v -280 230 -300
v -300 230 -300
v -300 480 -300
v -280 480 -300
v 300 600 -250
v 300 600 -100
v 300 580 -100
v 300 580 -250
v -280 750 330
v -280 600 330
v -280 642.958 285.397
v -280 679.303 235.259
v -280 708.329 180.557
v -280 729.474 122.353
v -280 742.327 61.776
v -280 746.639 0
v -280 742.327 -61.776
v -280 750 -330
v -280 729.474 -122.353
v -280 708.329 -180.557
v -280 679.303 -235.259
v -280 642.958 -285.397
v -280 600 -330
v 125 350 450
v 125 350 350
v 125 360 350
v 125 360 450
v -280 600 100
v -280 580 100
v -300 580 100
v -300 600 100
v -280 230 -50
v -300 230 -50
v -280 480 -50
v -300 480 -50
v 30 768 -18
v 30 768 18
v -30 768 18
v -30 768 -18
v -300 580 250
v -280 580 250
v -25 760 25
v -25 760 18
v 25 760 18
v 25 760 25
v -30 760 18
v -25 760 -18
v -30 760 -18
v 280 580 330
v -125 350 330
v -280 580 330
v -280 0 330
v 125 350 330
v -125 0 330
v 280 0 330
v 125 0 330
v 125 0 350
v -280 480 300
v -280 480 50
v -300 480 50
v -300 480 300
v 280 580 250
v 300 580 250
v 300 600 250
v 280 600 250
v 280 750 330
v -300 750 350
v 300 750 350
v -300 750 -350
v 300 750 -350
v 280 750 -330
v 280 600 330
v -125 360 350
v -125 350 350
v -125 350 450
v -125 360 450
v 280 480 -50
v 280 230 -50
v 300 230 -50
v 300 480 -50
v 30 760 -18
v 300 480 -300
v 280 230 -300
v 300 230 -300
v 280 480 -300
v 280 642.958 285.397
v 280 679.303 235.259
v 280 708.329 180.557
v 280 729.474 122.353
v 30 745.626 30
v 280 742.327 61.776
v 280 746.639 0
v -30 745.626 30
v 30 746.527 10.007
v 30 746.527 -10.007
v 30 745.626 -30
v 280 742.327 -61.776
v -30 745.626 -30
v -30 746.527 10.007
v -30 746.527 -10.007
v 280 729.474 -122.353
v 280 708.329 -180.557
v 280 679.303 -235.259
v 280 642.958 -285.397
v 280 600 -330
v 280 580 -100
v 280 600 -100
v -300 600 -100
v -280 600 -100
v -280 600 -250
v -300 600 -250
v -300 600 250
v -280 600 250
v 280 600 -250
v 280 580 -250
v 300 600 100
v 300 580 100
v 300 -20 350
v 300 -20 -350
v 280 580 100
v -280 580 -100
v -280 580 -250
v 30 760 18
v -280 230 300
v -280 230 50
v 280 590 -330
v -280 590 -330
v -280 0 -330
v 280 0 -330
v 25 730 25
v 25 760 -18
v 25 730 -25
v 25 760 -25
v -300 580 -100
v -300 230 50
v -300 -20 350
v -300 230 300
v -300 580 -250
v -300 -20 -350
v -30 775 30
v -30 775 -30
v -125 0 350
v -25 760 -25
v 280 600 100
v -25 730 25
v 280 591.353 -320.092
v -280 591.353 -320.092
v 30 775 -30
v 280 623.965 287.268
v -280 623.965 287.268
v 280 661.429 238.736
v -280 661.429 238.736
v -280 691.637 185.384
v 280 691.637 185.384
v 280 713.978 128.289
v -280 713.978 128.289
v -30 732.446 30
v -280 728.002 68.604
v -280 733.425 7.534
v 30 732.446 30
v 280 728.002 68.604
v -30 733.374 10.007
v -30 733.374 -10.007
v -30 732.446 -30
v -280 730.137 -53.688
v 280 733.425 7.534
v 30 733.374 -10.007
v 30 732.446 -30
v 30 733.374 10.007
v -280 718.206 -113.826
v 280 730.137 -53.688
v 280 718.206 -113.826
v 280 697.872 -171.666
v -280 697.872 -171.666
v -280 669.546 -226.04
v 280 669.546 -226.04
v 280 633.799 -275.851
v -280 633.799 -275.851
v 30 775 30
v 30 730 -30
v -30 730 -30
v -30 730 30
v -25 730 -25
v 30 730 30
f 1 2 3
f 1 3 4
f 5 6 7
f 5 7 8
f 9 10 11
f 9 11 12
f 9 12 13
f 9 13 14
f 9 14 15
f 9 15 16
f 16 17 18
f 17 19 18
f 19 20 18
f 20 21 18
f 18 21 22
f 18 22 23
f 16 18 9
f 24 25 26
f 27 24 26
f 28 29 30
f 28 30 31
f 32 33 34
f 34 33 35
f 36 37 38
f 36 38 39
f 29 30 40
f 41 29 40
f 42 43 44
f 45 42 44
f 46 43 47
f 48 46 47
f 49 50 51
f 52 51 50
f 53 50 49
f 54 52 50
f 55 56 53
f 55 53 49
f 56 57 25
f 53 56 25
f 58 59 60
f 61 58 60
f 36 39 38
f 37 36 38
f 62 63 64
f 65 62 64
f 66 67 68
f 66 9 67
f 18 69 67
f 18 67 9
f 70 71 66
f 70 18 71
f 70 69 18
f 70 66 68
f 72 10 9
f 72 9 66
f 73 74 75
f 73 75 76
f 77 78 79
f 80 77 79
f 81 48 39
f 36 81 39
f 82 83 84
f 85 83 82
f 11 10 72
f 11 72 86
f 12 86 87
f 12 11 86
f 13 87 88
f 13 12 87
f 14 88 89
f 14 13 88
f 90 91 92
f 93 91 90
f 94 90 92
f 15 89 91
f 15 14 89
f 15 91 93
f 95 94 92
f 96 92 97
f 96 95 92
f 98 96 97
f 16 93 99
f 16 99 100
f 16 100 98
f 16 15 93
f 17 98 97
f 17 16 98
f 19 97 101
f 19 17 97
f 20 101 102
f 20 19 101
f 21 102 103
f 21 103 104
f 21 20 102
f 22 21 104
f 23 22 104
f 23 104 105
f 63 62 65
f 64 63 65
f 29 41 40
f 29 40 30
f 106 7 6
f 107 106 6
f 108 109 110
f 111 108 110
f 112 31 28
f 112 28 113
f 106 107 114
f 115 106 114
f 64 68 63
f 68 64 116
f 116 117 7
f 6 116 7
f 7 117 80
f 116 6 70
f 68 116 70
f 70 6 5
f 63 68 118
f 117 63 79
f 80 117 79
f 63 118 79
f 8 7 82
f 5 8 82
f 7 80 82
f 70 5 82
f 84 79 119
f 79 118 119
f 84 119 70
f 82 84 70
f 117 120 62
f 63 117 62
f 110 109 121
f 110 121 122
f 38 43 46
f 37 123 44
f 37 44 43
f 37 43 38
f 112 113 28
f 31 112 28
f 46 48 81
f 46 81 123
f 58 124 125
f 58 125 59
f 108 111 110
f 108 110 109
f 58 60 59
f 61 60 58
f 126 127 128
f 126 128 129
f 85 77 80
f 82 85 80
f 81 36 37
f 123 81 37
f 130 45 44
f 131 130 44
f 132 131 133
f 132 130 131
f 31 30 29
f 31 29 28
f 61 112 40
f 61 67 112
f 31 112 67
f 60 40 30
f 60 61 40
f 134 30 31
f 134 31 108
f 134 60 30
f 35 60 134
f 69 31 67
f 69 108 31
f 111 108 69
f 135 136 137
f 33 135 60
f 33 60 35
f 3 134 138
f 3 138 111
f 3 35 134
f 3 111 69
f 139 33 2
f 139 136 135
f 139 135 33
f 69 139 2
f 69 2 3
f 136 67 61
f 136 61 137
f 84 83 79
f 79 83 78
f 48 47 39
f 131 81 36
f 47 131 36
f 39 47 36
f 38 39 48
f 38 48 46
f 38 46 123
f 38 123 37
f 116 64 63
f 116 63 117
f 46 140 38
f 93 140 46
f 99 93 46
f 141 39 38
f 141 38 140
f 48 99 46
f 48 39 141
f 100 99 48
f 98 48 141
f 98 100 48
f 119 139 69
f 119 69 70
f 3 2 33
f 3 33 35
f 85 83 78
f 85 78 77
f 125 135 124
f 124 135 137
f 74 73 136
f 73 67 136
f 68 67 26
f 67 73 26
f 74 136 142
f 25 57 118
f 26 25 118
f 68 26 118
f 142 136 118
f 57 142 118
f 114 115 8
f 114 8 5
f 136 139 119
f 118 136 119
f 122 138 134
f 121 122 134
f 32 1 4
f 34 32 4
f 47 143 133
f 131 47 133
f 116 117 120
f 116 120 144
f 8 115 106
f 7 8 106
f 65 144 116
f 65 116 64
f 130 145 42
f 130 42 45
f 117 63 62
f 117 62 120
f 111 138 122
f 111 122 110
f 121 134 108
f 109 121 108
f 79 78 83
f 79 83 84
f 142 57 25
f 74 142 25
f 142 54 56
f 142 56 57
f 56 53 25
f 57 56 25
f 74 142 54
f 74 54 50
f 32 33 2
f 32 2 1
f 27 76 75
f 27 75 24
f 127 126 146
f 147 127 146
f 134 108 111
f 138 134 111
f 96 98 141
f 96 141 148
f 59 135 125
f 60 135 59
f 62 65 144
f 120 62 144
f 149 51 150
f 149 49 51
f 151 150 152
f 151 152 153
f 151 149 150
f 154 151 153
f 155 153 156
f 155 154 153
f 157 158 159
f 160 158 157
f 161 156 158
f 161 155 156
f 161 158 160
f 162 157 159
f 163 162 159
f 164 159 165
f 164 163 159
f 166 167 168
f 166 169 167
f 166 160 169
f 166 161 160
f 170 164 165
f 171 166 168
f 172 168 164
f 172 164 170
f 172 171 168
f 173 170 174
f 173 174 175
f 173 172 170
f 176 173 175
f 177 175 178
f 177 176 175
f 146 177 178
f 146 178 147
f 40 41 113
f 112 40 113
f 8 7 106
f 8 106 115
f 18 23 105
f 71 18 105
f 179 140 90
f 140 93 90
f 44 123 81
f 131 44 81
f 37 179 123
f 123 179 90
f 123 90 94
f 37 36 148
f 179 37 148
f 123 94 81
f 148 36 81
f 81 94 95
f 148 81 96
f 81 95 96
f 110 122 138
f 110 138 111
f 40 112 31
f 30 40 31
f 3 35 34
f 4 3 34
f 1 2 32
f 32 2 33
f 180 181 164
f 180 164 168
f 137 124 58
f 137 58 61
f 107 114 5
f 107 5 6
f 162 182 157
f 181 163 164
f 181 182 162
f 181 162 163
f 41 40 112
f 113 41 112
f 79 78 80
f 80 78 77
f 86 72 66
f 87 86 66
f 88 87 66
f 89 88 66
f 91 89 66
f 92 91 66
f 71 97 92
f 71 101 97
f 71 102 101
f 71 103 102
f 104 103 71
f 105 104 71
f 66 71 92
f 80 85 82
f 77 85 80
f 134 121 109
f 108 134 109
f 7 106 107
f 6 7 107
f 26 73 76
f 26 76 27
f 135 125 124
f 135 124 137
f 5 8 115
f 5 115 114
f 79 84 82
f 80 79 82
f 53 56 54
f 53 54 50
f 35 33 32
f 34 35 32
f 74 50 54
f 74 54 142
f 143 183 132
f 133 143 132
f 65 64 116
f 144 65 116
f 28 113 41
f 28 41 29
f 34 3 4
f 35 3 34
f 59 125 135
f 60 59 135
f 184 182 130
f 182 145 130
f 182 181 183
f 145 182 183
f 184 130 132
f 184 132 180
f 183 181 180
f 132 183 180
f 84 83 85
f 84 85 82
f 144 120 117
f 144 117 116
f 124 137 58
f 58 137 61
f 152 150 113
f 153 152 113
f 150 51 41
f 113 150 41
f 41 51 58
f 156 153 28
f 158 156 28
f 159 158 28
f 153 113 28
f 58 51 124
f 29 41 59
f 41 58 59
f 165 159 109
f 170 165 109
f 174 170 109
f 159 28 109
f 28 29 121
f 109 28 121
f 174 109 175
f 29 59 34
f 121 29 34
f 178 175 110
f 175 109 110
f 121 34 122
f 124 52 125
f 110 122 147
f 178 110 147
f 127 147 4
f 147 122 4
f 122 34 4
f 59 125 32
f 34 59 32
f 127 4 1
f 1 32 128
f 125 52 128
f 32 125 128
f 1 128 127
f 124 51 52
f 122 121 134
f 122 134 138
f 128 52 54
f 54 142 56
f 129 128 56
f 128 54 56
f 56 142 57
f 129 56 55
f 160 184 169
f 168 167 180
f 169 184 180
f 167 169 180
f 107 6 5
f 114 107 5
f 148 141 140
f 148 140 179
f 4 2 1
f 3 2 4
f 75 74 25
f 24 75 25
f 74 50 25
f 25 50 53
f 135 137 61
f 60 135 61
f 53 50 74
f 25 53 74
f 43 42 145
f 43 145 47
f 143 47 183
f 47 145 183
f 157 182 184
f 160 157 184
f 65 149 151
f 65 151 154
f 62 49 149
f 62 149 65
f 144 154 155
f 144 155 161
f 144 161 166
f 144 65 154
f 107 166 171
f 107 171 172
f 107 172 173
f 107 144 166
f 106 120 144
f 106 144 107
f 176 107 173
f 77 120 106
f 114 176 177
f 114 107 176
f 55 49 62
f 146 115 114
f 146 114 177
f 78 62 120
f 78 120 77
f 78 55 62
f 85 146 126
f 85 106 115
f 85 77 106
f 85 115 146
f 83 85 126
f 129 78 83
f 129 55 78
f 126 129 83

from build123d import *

# Parameters (mm, degrees)
SKETCH16_W             = 600
SKETCH16_H             = 700
BOSS_EXTRUDE1_DEPTH    = 20
SKETCH16_2_W           = 600
SKETCH16_2_H           = 700
BOSS_EXTRUDE2_DEPTH    = 750
SHELL1_T               = -20
SKETCH17_W             = 560
SKETCH17_H             = 20
SKETCH28_W             = 250
SKETCH28_H             = 250
CUT_EXTRUDE6_DEPTH     = 1023.252415013
SKETCH28_5_W           = 250
SKETCH28_5_H           = 250
CUT_EXTRUDE7_DEPTH     = 170
SKETCH28_6_W           = 150
SKETCH28_6_H           = 20
CUT_EXTRUDE8_DEPTH     = 1023.252415013
SKETCH28_7_W           = 150
SKETCH28_7_H           = 20
CUT_EXTRUDE9_DEPTH     = 1023.252415013
SKETCH35_W             = 250
SKETCH35_H             = 350
CUT_EXTRUDE10_DEPTH    = 170
SKETCH36_W             = 250
SKETCH36_H             = 10
BOSS_EXTRUDE6_DEPTH    = 100
SKETCH45_W             = 60
SKETCH45_H             = 60
BOSS_EXTRUDE7_DEPTH    = 40
SKETCH46_W             = 50
SKETCH46_H             = 50
CUT_EXTRUDE12_DEPTH    = 30
SKETCH47_W             = 60
SKETCH47_H             = 60
BOSS_EXTRUDE8_DEPTH    = 5
SKETCH48_W             = 36
SKETCH48_H             = 8
CUT_EXTRUDE13_DEPTH    = 63
SKETCH49_W             = 20
SKETCH49_H             = 350
BOSS_EXTRUDE10_DEPTH   = 250
SKETCH50_W             = 20
SKETCH50_H             = 250
BOSS_EXTRUDE11_DEPTH   = 250
SKETCH52_W             = 20
SKETCH52_H             = 250
BOSS_EXTRUDE12_DEPTH   = 250
SKETCH53_W             = 20
SKETCH53_H             = 250
BOSS_EXTRUDE13_DEPTH   = 250
SKETCH54_W             = 36
SKETCH54_H             = 8
BOSS_EXTRUDE14_DEPTH   = 60
SKETCH55_W             = 150
SKETCH55_H             = 20
BOSS_EXTRUDE15_DEPTH   = 20
BOSS_EXTRUDE15_2_DEPTH = 20
SKETCH56_W             = 150
SKETCH56_H             = 20
BOSS_EXTRUDE16_DEPTH   = 20
BOSS_EXTRUDE16_2_DEPTH = 20


with BuildPart() as part:
    # Sketch16 → Boss-Extrude1 (new body)
    with BuildSketch(Plane(origin=(0, 0, 0), x_dir=(1, 0, 0), z_dir=(0, 1, 0))):
        Rectangle(SKETCH16_W, SKETCH16_H)
    extrude(amount=-BOSS_EXTRUDE1_DEPTH)

    # Sketch16<2> → Boss-Extrude2 (add)
    with BuildSketch(Plane(origin=(0, 0, 0), x_dir=(1, 0, 0), z_dir=(0, 1, 0))):
        Rectangle(SKETCH16_2_W, SKETCH16_2_H)
    extrude(amount=BOSS_EXTRUDE2_DEPTH)

    # Shell1
    shell1_openings = [part.faces().sort_by_distance(p)[0] for p in [
        (0, 750, 0),
    ]]
    offset(amount=SHELL1_T, openings=shell1_openings, kind=Kind.INTERSECTION)

    # Sweep1: sweep along a path in Sketch18
    with BuildLine(Plane(origin=(0, 0, 0), x_dir=(0, 0, -1), z_dir=(1, 0, 0))) as sweep1_path:
        ThreePointArc((-330, 590), (0, 740), (330, 590))
    # Sketch17 → Sweep1 (sweep)
    with BuildSketch(Plane.XY.offset(330)):
        with Locations((0, 590)):
            Rectangle(SKETCH17_W, SKETCH17_H)
    sweep(path=sweep1_path.line)

    # Sketch28 → Cut-Extrude6 (cut, through all)
    with BuildSketch(Plane.ZY.offset(300)):
        with Locations((-175, 355)):
            Rectangle(SKETCH28_W, SKETCH28_H)
    extrude(amount=-CUT_EXTRUDE6_DEPTH, mode=Mode.SUBTRACT)

    # Sketch28<5> → Cut-Extrude7 (cut)
    with BuildSketch(Plane.ZY.offset(300)):
        with Locations((175, 355)):
            Rectangle(SKETCH28_5_W, SKETCH28_5_H)
    extrude(amount=-CUT_EXTRUDE7_DEPTH, mode=Mode.SUBTRACT)

    # Sketch28<6> → Cut-Extrude8 (cut, through all)
    with BuildSketch(Plane.ZY.offset(300)):
        with Locations((-175, 590)):
            Rectangle(SKETCH28_6_W, SKETCH28_6_H)
    extrude(amount=-CUT_EXTRUDE8_DEPTH, mode=Mode.SUBTRACT)

    # Sketch28<7> → Cut-Extrude9 (cut, through all)
    with BuildSketch(Plane.ZY.offset(300)):
        with Locations((175, 590)):
            Rectangle(SKETCH28_7_W, SKETCH28_7_H)
    extrude(amount=-CUT_EXTRUDE9_DEPTH, mode=Mode.SUBTRACT)

    # Sketch35 → Cut-Extrude10 (cut)
    with BuildSketch(Plane.XY.offset(350)):
        with Locations((0, 175)):
            Rectangle(SKETCH35_W, SKETCH35_H)
    extrude(amount=-CUT_EXTRUDE10_DEPTH, mode=Mode.SUBTRACT)

    # Sketch36 → Boss-Extrude6 (add)
    with BuildSketch(Plane.XY.offset(350)):
        with Locations((0, 355)):
            Rectangle(SKETCH36_W, SKETCH36_H)
    extrude(amount=BOSS_EXTRUDE6_DEPTH)

    # Sketch45 → Boss-Extrude7 (add)
    with BuildSketch(Plane(origin=(0, 730, 0), x_dir=(1, 0, 0), z_dir=(0, 1, 0))):
        Rectangle(SKETCH45_W, SKETCH45_H)
    extrude(amount=BOSS_EXTRUDE7_DEPTH)

    # Sketch46 → Cut-Extrude12 (cut)
    with BuildSketch(Plane(origin=(0, 730, 0), x_dir=(1, 0, 0), z_dir=(0, 1, 0))):
        Rectangle(SKETCH46_W, SKETCH46_H)
    extrude(amount=CUT_EXTRUDE12_DEPTH, mode=Mode.SUBTRACT)

    # Sketch47 → Boss-Extrude8 (add)
    with BuildSketch(Plane(origin=(0, 770, 0), x_dir=(1, 0, 0), z_dir=(0, 1, 0))):
        Rectangle(SKETCH47_W, SKETCH47_H)
    extrude(amount=BOSS_EXTRUDE8_DEPTH)

    # Sketch48 → Cut-Extrude13 (cut)
    with BuildSketch(Plane(origin=(30, 0, 0), x_dir=(0, 0, -1), z_dir=(1, 0, 0))):
        with Locations((0, 764)):
            Rectangle(SKETCH48_W, SKETCH48_H)
    extrude(amount=-CUT_EXTRUDE13_DEPTH, mode=Mode.SUBTRACT)


with BuildPart() as body_2:
    # Sketch49 → Boss-Extrude10 (new body)
    with BuildSketch(Plane.ZY.offset(-125)):
        with Locations((340, 175)):
            Rectangle(SKETCH49_W, SKETCH49_H)
    extrude(amount=BOSS_EXTRUDE10_DEPTH)


with BuildPart() as body_3:
    # Sketch50 → Boss-Extrude11 (new body)
    with BuildSketch(Plane.XY.offset(-300)):
        with Locations((290, 355)):
            Rectangle(SKETCH50_W, SKETCH50_H)
    extrude(amount=BOSS_EXTRUDE11_DEPTH)


with BuildPart() as body_4:
    # Sketch52 → Boss-Extrude12 (new body)
    with BuildSketch(Plane(origin=(0, 0, 300), x_dir=(-1, 0, 0), z_dir=(0, 0, -1))):
        with Locations((290, 355)):
            Rectangle(SKETCH52_W, SKETCH52_H)
    extrude(amount=BOSS_EXTRUDE12_DEPTH)


with BuildPart() as body_5:
    # Sketch53 → Boss-Extrude13 (new body)
    with BuildSketch(Plane.XY.offset(-300)):
        with Locations((-290, 355)):
            Rectangle(SKETCH53_W, SKETCH53_H)
    extrude(amount=BOSS_EXTRUDE13_DEPTH)


with BuildPart() as body_6:
    # Sketch54 → Boss-Extrude14 (new body)
    with BuildSketch(Plane.ZY.offset(30)):
        with Locations((0, 764)):
            Rectangle(SKETCH54_W, SKETCH54_H)
    extrude(amount=-BOSS_EXTRUDE14_DEPTH)


with BuildPart() as body_7:
    # Sketch55 → Boss-Extrude15 (new body)
    with BuildSketch(Plane(origin=(-280, 0, 0), x_dir=(0, 0, -1), z_dir=(1, 0, 0))):
        with Locations((175, 590)):
            Rectangle(SKETCH55_W, SKETCH55_H)
    extrude(amount=-BOSS_EXTRUDE15_DEPTH)


with BuildPart() as body_8:
    # Sketch55 → Boss-Extrude15 2 (new body)
    with BuildSketch(Plane(origin=(-280, 0, 0), x_dir=(0, 0, -1), z_dir=(1, 0, 0))):
        with Locations((-175, 590)):
            Rectangle(SKETCH55_W, SKETCH55_H)
    extrude(amount=-BOSS_EXTRUDE15_2_DEPTH)


with BuildPart() as body_9:
    # Sketch56 → Boss-Extrude16 (new body)
    with BuildSketch(Plane(origin=(300, 0, 0), x_dir=(0, 0, -1), z_dir=(1, 0, 0))):
        with Locations((175, 590)):
            Rectangle(SKETCH56_W, SKETCH56_H)
    extrude(amount=-BOSS_EXTRUDE16_DEPTH)


with BuildPart() as body_10:
    # Sketch56 → Boss-Extrude16 2 (new body)
    with BuildSketch(Plane(origin=(300, 0, 0), x_dir=(0, 0, -1), z_dir=(1, 0, 0))):
        with Locations((-175, 590)):
            Rectangle(SKETCH56_W, SKETCH56_H)
    extrude(amount=-BOSS_EXTRUDE16_2_DEPTH)


solid = Compound([part.part, body_2.part, body_3.part, body_4.part, body_5.part, body_6.part, body_7.part, body_8.part, body_9.part, body_10.part])
